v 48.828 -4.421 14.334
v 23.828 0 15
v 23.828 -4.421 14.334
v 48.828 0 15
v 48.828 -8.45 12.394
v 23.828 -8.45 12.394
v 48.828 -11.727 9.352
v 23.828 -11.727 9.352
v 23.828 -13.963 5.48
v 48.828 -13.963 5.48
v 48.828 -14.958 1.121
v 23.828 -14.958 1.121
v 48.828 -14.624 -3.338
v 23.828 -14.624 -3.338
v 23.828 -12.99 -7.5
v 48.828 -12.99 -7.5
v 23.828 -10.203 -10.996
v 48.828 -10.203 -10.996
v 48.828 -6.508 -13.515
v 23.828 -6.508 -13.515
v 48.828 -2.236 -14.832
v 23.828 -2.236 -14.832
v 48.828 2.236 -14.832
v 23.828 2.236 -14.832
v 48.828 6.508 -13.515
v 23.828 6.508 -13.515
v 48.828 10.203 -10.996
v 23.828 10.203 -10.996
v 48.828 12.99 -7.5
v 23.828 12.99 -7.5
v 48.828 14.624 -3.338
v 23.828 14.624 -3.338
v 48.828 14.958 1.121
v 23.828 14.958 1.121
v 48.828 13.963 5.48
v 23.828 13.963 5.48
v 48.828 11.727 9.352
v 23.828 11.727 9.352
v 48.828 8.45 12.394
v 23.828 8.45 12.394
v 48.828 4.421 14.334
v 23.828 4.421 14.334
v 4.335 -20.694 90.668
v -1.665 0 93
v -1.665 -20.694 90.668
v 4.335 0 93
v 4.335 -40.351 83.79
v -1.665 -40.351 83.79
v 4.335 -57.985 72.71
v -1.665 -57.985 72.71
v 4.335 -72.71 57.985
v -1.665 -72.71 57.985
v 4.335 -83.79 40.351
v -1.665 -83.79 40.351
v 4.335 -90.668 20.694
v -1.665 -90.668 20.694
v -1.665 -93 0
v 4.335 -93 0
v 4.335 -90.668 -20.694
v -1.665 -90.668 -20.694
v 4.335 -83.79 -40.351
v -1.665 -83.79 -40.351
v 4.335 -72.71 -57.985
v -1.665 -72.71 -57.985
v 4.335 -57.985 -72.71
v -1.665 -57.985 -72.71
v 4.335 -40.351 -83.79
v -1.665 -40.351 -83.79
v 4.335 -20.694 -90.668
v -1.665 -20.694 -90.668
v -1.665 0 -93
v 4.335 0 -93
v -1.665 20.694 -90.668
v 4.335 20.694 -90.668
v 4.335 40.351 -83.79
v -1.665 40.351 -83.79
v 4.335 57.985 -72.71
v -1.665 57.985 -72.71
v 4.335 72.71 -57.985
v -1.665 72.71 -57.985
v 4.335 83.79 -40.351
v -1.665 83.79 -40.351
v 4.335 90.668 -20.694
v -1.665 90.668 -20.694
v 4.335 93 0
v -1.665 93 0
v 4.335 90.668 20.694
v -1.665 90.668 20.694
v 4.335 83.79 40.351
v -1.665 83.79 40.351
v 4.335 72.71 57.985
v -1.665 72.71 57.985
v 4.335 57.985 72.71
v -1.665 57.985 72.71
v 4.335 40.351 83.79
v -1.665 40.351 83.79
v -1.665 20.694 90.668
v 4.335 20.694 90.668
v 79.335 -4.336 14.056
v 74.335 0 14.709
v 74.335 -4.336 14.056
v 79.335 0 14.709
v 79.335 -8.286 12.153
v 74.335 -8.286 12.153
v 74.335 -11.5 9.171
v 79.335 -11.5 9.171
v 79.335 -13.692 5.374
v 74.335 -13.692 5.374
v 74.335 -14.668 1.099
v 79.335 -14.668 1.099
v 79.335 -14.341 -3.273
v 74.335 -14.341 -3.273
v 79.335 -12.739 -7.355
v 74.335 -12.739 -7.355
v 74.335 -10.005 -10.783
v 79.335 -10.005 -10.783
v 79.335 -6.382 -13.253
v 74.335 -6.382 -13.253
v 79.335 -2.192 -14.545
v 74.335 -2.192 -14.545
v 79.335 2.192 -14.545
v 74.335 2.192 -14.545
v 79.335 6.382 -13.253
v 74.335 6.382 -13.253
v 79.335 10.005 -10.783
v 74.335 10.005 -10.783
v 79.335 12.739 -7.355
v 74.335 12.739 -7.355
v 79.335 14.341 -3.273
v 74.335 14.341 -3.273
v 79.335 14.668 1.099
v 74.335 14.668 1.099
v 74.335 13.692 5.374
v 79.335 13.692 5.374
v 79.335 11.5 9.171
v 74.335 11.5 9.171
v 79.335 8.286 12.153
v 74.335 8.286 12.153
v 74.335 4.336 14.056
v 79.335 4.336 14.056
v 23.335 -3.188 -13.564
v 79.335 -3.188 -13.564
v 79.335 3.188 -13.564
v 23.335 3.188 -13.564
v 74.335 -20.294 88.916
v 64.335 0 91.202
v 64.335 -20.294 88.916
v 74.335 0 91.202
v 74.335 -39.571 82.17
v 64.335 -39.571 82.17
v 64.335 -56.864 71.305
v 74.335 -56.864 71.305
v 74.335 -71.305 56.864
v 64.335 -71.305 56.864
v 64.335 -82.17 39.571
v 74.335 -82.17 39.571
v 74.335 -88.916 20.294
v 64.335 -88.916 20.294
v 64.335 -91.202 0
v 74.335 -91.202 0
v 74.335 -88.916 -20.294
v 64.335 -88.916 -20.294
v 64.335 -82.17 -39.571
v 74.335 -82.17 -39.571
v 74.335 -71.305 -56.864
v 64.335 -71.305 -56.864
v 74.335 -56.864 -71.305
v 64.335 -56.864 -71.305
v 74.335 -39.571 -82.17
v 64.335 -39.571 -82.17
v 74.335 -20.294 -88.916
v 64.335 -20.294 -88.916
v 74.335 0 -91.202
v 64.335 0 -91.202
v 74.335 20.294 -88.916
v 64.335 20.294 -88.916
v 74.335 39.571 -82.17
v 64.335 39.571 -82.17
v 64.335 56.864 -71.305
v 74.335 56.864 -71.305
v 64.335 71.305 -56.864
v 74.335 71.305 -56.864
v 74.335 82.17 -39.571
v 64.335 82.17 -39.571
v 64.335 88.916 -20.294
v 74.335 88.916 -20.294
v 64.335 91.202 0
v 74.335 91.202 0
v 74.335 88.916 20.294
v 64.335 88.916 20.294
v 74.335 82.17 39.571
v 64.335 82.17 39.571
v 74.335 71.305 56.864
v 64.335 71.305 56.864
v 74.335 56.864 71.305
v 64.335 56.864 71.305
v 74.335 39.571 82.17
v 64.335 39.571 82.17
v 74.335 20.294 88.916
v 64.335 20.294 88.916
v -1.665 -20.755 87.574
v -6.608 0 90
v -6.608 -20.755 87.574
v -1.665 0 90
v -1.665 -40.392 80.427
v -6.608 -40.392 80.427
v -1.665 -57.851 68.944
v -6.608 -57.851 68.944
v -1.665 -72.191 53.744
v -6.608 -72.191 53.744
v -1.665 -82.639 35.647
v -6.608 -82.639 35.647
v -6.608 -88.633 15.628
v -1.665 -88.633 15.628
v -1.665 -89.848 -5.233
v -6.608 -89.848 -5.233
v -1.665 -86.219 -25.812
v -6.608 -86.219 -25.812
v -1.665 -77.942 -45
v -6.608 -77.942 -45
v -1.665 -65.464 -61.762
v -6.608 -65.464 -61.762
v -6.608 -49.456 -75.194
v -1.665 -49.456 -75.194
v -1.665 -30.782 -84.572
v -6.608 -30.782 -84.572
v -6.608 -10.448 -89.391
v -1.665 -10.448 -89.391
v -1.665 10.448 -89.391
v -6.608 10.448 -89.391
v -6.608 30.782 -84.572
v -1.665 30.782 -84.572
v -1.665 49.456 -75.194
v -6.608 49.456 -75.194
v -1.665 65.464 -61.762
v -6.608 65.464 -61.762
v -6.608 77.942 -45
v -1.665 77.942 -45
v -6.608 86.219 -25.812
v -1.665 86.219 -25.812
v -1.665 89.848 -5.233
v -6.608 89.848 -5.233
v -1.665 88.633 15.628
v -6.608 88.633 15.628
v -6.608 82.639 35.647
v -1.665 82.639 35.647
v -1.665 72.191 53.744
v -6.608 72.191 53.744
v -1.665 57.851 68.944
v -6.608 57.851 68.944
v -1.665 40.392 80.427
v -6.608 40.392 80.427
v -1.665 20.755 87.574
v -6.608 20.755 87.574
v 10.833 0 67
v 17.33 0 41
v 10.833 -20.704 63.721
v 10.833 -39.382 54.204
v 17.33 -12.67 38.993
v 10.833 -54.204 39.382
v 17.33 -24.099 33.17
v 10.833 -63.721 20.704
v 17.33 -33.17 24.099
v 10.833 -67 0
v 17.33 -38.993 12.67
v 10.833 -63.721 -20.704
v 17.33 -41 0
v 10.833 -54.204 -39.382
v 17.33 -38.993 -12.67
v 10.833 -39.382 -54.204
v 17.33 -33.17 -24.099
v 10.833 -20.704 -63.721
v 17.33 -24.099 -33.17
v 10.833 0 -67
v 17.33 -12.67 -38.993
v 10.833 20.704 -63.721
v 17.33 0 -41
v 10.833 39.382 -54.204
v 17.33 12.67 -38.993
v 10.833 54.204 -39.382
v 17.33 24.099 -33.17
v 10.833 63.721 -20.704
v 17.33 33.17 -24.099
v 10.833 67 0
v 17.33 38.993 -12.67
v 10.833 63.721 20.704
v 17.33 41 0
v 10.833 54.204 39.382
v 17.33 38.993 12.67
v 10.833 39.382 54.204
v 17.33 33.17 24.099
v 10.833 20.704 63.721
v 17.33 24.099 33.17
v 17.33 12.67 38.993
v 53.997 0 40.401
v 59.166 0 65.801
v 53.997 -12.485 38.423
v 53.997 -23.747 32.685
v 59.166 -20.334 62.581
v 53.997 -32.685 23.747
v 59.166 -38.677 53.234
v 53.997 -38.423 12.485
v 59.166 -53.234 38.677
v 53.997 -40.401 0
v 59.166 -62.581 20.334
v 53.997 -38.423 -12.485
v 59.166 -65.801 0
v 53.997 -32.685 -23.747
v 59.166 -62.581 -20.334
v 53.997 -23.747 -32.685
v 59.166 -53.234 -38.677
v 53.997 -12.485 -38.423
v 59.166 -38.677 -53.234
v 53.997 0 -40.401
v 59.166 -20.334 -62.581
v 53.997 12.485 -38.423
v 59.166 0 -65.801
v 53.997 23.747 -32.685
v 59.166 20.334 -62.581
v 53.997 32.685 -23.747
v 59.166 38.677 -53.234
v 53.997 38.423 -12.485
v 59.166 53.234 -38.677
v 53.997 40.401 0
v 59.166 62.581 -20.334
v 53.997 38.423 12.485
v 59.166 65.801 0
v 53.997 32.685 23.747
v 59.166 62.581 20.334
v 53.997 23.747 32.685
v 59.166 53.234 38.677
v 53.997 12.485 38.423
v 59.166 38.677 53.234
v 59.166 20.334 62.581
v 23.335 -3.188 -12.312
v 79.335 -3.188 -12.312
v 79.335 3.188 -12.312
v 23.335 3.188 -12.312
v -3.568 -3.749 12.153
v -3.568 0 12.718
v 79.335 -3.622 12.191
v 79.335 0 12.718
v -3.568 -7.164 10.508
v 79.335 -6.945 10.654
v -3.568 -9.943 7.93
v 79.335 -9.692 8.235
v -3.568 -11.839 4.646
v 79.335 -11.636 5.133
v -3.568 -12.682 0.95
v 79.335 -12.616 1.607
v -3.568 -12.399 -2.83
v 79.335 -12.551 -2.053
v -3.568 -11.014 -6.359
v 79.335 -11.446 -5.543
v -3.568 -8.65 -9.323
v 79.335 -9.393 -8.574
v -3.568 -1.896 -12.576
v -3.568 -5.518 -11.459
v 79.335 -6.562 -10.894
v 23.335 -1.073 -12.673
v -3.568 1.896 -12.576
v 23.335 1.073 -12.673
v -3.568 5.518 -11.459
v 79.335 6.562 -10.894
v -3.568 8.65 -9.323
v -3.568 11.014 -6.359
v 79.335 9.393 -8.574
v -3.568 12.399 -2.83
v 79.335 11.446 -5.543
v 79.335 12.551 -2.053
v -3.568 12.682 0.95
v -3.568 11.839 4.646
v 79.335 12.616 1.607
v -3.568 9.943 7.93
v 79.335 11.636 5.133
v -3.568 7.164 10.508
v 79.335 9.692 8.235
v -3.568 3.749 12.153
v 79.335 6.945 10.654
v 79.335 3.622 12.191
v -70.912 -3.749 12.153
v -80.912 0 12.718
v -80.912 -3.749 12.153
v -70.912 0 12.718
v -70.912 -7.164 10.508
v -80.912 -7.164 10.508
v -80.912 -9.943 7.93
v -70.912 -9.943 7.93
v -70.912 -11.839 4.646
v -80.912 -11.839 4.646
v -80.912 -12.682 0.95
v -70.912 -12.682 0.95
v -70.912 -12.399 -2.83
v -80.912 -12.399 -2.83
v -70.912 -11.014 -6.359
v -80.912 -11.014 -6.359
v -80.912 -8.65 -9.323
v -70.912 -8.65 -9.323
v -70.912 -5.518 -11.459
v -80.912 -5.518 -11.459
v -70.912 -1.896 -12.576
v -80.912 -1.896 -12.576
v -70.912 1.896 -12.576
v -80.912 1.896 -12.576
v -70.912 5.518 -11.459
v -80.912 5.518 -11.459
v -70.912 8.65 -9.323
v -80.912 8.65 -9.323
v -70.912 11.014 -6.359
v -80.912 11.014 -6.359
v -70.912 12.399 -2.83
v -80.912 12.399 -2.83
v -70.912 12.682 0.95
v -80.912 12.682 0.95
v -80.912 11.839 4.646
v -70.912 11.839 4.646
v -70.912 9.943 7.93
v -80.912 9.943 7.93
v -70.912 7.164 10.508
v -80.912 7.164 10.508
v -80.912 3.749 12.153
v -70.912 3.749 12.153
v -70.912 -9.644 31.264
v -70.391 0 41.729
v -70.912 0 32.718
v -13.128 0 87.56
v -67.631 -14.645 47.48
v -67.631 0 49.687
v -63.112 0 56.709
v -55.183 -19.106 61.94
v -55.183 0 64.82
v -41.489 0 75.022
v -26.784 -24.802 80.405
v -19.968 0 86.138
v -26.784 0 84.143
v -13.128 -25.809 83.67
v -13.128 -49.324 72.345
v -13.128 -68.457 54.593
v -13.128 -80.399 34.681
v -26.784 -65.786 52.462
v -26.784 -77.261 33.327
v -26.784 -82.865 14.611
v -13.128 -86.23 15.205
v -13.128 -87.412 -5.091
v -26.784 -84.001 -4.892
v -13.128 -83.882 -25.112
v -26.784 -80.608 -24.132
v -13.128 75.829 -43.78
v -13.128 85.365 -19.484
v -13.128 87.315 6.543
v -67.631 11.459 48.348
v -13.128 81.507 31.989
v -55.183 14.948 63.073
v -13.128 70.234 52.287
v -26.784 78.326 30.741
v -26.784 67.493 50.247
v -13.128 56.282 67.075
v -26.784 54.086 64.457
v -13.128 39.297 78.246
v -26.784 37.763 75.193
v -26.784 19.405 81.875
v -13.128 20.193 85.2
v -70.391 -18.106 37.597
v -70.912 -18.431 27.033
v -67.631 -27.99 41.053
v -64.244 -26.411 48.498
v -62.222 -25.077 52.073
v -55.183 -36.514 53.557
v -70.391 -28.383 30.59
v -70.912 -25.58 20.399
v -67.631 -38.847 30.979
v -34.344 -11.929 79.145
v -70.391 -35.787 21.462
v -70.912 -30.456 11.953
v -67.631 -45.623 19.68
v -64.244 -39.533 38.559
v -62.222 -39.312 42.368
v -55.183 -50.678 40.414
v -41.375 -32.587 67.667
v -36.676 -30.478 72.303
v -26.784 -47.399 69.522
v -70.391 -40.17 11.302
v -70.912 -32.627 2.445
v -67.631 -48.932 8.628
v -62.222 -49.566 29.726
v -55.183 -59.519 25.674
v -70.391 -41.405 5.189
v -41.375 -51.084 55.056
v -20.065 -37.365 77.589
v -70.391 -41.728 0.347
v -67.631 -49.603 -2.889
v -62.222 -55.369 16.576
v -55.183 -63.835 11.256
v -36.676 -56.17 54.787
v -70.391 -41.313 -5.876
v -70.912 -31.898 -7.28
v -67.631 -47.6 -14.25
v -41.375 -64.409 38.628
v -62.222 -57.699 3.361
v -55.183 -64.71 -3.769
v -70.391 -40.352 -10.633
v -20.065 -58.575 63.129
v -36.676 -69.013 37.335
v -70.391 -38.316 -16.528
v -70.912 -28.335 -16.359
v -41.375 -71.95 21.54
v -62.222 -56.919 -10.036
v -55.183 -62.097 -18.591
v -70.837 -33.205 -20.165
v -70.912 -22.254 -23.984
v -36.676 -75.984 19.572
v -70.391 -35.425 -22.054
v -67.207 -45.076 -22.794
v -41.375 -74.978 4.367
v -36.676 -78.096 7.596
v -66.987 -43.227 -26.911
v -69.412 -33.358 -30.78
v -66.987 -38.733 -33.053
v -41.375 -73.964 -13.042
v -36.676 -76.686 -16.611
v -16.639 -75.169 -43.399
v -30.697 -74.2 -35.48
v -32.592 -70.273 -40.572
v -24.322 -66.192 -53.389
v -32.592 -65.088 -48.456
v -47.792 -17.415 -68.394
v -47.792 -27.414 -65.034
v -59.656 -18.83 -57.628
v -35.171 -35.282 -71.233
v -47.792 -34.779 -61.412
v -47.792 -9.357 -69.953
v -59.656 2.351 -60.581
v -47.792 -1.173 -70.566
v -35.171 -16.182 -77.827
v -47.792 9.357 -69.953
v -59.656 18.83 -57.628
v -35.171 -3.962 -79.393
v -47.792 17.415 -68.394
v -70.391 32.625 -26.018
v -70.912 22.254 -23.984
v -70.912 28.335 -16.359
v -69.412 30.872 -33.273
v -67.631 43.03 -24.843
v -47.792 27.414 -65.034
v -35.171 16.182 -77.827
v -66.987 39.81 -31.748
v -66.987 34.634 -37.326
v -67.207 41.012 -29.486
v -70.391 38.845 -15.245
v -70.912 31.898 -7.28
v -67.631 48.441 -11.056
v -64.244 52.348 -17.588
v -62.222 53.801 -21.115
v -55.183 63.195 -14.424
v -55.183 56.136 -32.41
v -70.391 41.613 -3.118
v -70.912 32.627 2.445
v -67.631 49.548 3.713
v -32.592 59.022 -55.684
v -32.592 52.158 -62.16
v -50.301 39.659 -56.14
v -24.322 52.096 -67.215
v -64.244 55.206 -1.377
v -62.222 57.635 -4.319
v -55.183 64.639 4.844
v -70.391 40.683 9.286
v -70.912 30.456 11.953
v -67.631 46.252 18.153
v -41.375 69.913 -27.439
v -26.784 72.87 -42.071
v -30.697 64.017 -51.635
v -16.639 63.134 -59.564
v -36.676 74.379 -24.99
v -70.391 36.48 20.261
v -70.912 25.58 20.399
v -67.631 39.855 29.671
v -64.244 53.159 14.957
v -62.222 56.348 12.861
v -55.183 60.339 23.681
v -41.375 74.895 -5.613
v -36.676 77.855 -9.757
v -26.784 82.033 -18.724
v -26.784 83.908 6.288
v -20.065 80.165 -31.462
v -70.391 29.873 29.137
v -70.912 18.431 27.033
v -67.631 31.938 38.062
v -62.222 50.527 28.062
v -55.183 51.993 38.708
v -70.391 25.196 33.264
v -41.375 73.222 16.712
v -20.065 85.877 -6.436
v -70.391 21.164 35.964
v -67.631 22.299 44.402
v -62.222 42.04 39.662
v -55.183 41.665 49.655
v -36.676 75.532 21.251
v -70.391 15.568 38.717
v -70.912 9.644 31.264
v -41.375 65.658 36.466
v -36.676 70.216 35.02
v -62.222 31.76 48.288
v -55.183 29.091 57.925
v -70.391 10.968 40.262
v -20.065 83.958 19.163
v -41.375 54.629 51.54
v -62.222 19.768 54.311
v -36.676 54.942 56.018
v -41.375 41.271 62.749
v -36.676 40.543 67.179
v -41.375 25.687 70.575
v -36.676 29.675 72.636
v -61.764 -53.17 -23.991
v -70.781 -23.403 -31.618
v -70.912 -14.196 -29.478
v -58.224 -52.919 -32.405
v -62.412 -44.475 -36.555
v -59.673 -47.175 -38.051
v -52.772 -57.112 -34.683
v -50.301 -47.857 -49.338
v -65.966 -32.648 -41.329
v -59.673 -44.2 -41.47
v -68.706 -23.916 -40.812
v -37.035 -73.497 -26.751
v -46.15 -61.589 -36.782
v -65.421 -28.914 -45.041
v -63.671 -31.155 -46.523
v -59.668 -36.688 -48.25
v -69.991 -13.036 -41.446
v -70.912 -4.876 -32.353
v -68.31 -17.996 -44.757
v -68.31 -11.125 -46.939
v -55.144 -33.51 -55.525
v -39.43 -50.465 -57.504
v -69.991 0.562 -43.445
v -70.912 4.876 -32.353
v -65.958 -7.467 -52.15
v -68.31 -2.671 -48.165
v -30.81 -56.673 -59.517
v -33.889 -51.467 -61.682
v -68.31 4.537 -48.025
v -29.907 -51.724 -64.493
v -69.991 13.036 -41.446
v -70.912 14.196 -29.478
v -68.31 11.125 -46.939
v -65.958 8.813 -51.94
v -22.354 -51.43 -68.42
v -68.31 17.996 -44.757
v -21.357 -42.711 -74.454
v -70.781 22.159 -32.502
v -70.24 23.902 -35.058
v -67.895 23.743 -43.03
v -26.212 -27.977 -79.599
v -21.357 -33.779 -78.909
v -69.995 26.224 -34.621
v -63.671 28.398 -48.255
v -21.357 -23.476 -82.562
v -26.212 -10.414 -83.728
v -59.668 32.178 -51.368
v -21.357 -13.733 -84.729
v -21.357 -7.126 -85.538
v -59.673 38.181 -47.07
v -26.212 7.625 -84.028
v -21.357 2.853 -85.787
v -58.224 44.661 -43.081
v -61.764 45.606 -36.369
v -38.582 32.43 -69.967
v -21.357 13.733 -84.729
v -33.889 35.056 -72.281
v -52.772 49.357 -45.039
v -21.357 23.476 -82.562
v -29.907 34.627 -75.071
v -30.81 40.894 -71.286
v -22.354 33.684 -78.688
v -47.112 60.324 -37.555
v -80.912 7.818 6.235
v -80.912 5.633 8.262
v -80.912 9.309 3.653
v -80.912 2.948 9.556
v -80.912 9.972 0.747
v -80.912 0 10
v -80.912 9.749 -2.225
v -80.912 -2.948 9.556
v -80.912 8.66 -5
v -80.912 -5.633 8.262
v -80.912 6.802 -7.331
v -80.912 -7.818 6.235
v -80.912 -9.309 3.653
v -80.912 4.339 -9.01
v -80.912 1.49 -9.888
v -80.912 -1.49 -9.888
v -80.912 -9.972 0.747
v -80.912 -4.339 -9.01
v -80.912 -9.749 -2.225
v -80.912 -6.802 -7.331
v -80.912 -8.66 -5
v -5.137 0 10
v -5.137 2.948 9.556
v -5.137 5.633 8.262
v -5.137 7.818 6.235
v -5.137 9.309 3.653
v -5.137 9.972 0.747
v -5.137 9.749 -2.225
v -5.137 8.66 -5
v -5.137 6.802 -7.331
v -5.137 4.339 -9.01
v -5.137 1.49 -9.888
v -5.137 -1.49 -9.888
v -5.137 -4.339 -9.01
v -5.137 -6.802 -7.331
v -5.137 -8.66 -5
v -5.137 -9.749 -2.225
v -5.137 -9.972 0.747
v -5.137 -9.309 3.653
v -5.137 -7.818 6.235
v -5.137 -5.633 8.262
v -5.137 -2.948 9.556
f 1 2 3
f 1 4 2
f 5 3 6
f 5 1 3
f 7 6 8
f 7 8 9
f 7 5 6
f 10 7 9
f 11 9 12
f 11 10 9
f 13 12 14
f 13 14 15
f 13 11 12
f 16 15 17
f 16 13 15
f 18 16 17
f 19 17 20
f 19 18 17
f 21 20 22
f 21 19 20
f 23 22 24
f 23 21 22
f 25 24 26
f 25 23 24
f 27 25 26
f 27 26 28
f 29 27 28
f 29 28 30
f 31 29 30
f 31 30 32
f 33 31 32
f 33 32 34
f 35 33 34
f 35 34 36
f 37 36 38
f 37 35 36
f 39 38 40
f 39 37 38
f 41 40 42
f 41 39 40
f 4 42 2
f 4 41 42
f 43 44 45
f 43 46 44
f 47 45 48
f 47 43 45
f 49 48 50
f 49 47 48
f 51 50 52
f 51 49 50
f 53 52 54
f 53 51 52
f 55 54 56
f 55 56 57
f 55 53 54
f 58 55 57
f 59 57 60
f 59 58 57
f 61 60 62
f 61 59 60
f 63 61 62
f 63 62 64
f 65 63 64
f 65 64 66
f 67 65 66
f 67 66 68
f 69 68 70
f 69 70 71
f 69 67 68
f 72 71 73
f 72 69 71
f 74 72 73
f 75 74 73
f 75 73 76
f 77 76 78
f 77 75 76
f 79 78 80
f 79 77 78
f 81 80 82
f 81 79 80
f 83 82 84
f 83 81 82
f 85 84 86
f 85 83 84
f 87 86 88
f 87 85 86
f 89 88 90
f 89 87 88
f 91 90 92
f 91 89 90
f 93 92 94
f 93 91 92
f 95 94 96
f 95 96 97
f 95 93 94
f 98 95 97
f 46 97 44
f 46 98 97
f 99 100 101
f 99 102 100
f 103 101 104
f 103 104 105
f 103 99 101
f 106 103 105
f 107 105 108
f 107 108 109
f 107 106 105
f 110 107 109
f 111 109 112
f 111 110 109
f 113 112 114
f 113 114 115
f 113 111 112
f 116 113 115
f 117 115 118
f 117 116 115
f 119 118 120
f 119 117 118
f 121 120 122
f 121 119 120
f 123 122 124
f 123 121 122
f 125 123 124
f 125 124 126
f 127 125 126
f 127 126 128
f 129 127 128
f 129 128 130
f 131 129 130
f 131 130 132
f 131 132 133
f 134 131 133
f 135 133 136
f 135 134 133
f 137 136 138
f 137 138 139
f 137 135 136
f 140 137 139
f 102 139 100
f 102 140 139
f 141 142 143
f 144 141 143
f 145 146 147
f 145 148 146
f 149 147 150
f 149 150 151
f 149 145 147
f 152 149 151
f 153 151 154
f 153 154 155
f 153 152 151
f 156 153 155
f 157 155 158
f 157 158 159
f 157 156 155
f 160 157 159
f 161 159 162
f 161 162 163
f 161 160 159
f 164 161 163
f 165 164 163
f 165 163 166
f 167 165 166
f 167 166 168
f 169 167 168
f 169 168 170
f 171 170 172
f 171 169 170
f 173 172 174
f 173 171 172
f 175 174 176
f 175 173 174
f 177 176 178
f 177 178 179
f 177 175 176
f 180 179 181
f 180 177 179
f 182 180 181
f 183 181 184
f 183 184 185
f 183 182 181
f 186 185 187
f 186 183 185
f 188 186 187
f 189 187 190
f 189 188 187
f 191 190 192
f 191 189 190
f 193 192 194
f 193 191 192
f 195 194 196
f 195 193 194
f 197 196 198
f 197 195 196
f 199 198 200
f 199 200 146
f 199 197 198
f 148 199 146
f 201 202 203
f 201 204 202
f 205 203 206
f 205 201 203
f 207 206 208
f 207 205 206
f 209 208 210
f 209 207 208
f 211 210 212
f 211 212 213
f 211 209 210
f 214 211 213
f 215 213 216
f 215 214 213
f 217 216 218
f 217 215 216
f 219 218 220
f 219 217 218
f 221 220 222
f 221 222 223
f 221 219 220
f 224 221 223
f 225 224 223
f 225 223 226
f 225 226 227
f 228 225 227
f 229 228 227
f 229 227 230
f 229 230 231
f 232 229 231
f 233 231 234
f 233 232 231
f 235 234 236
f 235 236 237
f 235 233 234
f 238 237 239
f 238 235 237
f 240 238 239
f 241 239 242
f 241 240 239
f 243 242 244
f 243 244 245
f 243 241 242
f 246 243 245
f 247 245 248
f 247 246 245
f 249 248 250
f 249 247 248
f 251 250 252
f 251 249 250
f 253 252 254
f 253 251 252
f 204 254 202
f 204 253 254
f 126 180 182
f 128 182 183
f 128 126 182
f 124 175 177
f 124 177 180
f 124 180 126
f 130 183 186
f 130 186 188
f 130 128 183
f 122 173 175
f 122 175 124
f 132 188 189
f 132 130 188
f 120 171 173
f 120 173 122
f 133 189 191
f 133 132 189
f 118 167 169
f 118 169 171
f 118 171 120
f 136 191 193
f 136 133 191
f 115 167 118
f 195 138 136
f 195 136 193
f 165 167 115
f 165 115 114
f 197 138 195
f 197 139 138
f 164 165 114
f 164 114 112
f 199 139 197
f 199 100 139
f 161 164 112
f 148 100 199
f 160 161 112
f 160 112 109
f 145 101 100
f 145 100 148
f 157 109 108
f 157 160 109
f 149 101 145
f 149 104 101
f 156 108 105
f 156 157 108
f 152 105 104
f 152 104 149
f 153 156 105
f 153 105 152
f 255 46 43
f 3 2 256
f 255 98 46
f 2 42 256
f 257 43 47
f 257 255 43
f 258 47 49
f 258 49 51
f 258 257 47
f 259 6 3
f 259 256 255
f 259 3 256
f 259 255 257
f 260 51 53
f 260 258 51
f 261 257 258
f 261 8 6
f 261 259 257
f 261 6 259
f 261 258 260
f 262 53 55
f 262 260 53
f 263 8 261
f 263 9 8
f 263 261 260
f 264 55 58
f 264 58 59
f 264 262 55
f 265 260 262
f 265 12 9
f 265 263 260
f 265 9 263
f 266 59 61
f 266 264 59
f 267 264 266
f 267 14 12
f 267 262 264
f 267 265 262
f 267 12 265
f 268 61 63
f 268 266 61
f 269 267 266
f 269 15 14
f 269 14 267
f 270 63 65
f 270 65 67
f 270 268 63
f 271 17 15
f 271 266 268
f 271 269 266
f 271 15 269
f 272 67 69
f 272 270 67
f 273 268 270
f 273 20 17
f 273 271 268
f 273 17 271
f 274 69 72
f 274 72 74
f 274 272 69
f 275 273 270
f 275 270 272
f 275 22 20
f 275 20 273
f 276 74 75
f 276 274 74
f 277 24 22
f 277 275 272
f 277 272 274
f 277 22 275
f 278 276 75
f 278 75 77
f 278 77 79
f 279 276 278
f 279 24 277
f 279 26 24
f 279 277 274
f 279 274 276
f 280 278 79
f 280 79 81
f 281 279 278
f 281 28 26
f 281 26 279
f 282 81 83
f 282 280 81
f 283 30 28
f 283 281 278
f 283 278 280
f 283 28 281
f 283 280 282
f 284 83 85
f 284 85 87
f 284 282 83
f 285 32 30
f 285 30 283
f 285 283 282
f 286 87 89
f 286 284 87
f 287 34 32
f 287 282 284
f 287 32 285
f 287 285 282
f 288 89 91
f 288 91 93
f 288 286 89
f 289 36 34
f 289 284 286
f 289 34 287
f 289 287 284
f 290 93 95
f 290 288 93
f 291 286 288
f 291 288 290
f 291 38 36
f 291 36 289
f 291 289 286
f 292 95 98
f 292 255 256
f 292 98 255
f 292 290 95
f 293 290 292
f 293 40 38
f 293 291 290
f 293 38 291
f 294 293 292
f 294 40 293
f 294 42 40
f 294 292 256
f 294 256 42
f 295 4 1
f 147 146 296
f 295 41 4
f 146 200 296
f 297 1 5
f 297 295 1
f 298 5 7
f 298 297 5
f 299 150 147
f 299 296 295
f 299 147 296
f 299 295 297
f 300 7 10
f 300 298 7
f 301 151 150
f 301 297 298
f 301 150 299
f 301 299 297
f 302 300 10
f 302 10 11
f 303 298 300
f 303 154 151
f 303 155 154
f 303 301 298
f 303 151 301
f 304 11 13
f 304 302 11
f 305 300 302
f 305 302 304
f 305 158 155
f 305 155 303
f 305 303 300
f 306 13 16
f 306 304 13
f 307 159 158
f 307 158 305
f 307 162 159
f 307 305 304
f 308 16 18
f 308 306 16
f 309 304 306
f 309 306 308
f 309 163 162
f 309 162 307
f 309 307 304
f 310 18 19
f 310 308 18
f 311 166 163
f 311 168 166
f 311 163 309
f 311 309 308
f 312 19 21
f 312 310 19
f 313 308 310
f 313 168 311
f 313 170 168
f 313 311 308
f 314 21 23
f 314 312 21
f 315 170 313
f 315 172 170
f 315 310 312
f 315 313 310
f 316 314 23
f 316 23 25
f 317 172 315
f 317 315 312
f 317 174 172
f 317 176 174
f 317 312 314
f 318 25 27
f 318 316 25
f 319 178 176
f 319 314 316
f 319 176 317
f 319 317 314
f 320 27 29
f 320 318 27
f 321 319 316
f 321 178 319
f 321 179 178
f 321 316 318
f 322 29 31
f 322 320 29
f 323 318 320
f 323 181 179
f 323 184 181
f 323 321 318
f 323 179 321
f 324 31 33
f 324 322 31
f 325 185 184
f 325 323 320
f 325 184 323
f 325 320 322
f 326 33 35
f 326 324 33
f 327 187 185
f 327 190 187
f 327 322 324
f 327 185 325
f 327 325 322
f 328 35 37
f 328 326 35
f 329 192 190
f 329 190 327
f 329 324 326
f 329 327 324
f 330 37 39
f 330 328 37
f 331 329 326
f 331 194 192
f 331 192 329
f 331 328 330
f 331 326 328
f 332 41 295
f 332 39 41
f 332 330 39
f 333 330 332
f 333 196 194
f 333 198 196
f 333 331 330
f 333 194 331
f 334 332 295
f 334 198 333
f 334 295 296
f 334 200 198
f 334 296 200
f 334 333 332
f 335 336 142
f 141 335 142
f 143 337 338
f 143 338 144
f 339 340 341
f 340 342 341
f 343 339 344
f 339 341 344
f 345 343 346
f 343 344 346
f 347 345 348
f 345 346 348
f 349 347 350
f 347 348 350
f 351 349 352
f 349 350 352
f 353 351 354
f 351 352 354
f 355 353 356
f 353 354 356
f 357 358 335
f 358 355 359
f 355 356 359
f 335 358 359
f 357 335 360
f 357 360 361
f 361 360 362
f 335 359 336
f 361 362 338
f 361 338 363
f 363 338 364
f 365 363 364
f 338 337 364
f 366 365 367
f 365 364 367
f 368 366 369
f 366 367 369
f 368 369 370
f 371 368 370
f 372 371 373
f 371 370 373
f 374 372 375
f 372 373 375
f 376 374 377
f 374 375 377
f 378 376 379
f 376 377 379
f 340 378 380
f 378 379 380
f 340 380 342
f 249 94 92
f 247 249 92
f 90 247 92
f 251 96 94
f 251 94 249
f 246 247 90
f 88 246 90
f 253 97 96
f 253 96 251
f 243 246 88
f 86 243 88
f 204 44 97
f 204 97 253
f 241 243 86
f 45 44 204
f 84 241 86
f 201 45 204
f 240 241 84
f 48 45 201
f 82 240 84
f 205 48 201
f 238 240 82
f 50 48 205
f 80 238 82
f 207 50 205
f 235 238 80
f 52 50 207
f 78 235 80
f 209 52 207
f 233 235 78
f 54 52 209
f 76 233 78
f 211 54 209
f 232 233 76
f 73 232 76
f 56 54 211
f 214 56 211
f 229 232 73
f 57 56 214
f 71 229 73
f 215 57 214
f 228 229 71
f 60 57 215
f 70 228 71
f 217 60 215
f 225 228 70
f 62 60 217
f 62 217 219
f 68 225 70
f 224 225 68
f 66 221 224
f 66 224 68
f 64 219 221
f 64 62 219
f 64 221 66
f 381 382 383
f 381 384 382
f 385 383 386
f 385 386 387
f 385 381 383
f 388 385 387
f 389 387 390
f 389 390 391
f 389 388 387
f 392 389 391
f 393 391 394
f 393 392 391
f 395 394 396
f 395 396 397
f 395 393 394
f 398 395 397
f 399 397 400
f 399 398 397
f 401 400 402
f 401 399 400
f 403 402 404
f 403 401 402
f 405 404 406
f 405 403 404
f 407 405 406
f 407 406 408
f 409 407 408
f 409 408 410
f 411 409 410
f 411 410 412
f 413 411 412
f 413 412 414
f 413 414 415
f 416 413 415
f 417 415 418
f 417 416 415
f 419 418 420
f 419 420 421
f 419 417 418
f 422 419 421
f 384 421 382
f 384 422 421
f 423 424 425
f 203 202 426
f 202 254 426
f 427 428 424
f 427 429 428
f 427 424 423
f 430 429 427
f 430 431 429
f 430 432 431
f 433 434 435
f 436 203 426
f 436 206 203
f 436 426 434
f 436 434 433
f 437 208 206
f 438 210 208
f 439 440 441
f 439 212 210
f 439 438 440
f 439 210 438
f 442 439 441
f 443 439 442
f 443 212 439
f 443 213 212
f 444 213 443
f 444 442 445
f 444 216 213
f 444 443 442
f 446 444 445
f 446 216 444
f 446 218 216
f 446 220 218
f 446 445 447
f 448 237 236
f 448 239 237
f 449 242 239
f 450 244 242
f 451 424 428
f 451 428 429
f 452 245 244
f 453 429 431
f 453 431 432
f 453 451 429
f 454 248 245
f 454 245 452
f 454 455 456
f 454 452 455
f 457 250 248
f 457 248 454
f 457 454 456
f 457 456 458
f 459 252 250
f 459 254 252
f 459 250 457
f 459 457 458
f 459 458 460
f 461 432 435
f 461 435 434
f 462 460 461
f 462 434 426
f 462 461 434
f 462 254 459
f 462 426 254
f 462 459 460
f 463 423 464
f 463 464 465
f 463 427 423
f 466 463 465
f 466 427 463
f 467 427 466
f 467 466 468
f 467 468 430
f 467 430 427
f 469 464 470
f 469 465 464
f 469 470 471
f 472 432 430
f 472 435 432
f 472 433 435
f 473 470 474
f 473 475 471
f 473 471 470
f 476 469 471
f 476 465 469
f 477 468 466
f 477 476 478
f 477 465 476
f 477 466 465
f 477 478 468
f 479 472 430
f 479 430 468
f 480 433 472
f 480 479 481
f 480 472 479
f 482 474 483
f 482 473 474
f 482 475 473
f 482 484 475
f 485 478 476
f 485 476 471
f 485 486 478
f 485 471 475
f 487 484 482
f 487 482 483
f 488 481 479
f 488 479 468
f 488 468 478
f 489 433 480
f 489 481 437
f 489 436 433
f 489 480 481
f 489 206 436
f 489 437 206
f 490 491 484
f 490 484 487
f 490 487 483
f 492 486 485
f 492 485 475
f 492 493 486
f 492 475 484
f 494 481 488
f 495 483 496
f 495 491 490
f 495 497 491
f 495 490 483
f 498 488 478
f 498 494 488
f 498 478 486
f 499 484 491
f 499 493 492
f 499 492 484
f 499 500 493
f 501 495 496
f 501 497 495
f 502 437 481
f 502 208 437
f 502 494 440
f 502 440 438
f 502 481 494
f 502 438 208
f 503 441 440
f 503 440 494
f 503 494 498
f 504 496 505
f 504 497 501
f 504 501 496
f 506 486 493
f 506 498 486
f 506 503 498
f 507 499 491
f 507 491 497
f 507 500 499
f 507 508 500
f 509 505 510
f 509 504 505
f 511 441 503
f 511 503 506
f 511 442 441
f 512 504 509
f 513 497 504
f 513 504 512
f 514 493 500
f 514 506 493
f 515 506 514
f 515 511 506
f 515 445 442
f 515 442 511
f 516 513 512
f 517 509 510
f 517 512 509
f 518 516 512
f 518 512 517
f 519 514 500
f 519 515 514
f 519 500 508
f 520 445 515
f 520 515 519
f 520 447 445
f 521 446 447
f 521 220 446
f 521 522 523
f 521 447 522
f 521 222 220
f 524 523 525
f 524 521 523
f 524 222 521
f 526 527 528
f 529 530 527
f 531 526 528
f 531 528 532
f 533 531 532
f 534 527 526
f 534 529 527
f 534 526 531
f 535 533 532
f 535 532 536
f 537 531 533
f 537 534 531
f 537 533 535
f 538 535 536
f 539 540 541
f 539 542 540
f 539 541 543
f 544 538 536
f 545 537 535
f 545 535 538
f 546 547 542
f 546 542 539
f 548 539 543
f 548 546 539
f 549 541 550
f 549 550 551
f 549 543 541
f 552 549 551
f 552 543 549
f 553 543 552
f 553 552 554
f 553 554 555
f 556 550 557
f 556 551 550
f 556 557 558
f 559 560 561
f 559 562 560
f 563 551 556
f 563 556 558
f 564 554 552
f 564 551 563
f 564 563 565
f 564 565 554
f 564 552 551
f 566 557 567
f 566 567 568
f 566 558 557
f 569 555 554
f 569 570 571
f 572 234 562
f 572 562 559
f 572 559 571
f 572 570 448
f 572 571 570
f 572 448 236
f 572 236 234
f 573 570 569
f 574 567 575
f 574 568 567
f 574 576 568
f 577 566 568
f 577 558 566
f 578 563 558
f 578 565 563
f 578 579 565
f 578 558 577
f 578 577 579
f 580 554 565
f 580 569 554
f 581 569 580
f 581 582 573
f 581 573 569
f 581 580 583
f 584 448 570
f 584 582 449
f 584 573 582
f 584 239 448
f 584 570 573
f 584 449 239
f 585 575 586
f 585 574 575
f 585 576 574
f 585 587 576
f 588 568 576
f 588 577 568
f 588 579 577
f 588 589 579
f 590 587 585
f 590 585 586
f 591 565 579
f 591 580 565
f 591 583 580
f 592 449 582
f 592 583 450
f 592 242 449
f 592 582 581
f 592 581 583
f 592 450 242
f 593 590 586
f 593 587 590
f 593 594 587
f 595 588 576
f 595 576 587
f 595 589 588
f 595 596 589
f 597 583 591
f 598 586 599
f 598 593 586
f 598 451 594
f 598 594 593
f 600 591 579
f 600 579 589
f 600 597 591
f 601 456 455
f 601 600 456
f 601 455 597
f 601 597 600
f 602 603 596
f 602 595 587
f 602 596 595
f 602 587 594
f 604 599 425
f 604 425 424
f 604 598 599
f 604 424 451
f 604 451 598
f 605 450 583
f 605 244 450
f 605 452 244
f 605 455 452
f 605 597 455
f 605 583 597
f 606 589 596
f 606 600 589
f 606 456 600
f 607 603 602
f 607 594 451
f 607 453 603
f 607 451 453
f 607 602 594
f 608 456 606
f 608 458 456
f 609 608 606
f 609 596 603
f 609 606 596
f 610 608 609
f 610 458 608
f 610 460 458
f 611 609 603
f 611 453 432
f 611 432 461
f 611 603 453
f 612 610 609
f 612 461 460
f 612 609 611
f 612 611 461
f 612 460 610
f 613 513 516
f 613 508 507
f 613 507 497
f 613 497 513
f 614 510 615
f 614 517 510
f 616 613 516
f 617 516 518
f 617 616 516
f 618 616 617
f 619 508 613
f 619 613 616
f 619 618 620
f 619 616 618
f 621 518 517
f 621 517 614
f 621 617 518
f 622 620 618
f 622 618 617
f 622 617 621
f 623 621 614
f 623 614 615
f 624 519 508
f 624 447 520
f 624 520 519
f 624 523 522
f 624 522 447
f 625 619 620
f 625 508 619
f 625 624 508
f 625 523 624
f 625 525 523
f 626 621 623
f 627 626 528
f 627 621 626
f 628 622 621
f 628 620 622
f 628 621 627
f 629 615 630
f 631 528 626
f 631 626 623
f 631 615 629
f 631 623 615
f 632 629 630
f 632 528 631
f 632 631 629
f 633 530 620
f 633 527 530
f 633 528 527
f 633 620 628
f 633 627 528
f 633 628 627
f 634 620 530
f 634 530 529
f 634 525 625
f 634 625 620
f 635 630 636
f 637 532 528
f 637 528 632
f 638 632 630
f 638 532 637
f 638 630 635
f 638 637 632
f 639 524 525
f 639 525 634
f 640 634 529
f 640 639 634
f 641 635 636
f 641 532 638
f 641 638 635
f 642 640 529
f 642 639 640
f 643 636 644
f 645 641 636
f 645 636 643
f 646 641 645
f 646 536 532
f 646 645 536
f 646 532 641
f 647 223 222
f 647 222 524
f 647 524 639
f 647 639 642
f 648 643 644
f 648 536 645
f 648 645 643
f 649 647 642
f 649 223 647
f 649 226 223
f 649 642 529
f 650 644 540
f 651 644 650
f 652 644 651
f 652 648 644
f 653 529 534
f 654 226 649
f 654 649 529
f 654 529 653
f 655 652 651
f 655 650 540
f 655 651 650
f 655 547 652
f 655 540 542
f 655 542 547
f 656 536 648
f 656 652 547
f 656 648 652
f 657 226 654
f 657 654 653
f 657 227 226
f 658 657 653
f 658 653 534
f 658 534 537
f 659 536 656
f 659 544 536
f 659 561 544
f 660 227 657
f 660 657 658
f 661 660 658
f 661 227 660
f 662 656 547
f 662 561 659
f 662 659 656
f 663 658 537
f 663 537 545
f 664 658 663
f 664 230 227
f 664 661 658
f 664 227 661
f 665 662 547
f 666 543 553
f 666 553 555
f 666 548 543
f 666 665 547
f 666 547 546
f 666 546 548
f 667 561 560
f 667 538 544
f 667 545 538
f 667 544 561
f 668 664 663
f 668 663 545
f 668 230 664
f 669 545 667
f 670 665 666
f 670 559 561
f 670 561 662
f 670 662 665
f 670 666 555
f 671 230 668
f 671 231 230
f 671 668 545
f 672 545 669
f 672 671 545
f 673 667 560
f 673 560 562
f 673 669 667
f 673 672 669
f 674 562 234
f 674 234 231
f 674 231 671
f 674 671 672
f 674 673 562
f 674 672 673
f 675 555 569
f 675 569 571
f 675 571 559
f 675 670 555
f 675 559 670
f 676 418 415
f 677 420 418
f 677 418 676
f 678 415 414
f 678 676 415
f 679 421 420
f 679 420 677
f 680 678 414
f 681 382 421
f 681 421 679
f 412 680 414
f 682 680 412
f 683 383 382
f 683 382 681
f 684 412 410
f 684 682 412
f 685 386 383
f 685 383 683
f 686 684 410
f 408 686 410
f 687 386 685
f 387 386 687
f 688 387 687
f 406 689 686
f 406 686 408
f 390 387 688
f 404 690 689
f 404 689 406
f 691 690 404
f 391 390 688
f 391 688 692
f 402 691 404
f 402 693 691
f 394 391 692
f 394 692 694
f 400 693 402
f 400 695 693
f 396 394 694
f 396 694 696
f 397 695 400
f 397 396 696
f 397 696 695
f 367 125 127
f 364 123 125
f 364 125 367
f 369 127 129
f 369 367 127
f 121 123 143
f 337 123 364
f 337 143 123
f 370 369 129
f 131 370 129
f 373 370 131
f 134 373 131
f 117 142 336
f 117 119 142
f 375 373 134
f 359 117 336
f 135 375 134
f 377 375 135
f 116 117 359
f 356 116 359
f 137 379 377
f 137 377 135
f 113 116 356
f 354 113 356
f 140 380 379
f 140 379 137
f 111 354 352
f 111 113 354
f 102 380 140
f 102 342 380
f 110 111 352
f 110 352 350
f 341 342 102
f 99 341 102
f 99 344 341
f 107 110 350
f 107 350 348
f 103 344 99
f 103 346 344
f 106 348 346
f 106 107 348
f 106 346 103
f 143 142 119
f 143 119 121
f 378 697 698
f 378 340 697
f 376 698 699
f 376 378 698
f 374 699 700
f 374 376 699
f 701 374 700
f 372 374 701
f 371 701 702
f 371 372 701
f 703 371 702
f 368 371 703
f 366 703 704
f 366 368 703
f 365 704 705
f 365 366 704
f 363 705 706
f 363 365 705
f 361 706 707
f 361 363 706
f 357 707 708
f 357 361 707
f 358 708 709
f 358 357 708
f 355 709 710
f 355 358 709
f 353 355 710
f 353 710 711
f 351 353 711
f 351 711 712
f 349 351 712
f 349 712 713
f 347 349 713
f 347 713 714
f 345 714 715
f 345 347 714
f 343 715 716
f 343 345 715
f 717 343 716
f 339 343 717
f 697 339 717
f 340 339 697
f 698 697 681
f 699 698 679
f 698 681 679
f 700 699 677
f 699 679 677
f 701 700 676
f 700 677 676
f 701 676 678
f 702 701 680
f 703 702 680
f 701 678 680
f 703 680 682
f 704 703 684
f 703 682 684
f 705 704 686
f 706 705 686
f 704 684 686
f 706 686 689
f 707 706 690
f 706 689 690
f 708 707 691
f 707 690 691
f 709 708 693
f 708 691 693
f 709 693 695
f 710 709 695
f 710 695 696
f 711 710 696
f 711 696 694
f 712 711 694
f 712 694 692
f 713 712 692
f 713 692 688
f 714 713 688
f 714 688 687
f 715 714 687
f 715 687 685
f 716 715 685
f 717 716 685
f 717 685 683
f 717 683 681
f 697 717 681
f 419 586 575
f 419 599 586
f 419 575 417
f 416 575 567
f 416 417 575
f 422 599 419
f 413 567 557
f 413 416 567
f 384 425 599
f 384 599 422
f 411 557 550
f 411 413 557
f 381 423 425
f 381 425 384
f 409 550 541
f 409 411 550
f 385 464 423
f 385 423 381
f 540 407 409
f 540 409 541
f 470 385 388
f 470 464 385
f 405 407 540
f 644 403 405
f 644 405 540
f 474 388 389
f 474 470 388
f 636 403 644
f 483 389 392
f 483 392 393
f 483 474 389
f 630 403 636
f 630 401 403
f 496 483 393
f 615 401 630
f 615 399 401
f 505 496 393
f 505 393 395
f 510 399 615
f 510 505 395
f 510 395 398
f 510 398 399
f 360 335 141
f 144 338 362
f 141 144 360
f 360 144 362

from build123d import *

# Parameters (mm, degrees)
SKETCH2_R          = 12.718
CUT_EXTRUDE1_DEPTH = 82.74
SKETCH3_R          = 10
CUT_EXTRUDE2_DEPTH = 79.507
SKETCH4_W          = 1.691
SKETCH4_H          = 6.375
CUT_EXTRUDE3_DEPTH = 56


with BuildPart() as part:
    # Sketch1 → Revolve1 (revolve)
    with BuildSketch(Plane.XY, mode=Mode.PRIVATE) as revolve1_sk:
        with BuildLine():
            Line((-80.911998208, 0), (-80.911998208, 12.718))
            Line((-80.911998208, 12.718), (-70.911998208, 12.718))
            Line((-70.911998208, 12.718), (-70.911998208, 32.718))
            add(Edge.make_bspline(
                [(-70.911998208, 32.718), (-72.296532146, 50.185235542), (-58.681197048, 63.170292577), (-38.636582778, 76.893357171), (-26.258344783, 86.831311493), (-12.152126662, 86.899446164), (-6.607628807, 90)],
                knots=[0, 0, 0, 0, 0.504233074, 0.563304469, 0.79660287, 1, 1, 1, 1], degree=3))
            Line((-6.607628807, 90), (-1.664998208, 90))
            Line((-1.664998208, 90), (-1.664998208, 93))
            Line((-1.664998208, 93), (4.335001792, 93))
            Line((4.335001792, 93), (23.827899809, 15))
            Line((23.827899809, 15), (48.827899809, 15))
            Line((48.827899809, 15), (64.335001792, 91.202154094))
            Line((64.335001792, 91.202154094), (74.335001792, 91.202154094))
            Line((74.335001792, 91.202154094), (74.335001792, 14.709294291))
            Line((74.335001792, 14.709294291), (79.335001792, 14.709294291))
            Line((79.335001792, 14.709294291), (79.335001792, 0))
            Line((79.335001792, 0), (-80.911998208, 0))
        make_face()
    revolve(revolve1_sk.sketch.rotate(Axis((-81.835688806, 0, 0), (1, 0, 0)), 90), axis=Axis((-81.835688806, 0, 0), (1, 0, 0)))

    # Sketch2 → Cut-Extrude1 (cut)
    with BuildSketch(Plane(origin=(79.335001792, 0, 0), x_dir=(0, 0, -1), z_dir=(1, 0, 0))):
        with Locations(Location((0, 0, 0), (0, 0, 180))):
            Circle(SKETCH2_R)
    extrude(amount=-CUT_EXTRUDE1_DEPTH, mode=Mode.SUBTRACT)

    # Sketch3 → Cut-Extrude2 (cut)
    with BuildSketch(Plane.ZY.offset(80.911998208)):
        Circle(SKETCH3_R)
    extrude(amount=-CUT_EXTRUDE2_DEPTH, mode=Mode.SUBTRACT)

    # Chamfer1
    # the kernel refuses this chamfer: 3, 1.732050808 mm, written as the material it takes off along each edge
    with BuildSketch(Plane(origin=(-3.404998208, 0, 0), x_dir=(0, 0, 1), z_dir=(0, -1, 0))) as chamfer1_piece_1_section:
        with BuildLine():
            Line((9.896076952, 1.792050808), (13.103923048, -0.06))
            Line((13.103923048, -0.06), (13.103923048, -0.12))
            ThreePointArc((13.103923048, -0.12), (11.551961524, -0.06), (10, -0.06))
            Line((10, -0.06), (9.94, 0))
            ThreePointArc((9.94, 0), (9.94, 0.896025404), (9.836076952, 1.792050808))
            Line((9.836076952, 1.792050808), (9.896076952, 1.792050808))
        make_face()
    chamfer1_piece_1 = revolve(axis=Axis((-3.404998208, 0, 0), (-1, 0, 0)), mode=Mode.PRIVATE)
    chamfer1_piece_1 = chamfer1_piece_1 & Plane(origin=(-4.331873762, 0, 0), x_dir=(0, 0, 1), z_dir=(1, 0, 0)) * Cylinder(12.718, 53, mode=Mode.PRIVATE)
    add(chamfer1_piece_1, mode=Mode.SUBTRACT)

    # Sketch4 → Cut-Extrude3 (cut)
    with BuildSketch(Plane(origin=(79.335001792, 0, 0), x_dir=(0, 0, -1), z_dir=(1, 0, 0))):
        with Locations((12.718, 0)):
            Rectangle(SKETCH4_W, SKETCH4_H)
    extrude(amount=-CUT_EXTRUDE3_DEPTH, mode=Mode.SUBTRACT)


solid = part.part
